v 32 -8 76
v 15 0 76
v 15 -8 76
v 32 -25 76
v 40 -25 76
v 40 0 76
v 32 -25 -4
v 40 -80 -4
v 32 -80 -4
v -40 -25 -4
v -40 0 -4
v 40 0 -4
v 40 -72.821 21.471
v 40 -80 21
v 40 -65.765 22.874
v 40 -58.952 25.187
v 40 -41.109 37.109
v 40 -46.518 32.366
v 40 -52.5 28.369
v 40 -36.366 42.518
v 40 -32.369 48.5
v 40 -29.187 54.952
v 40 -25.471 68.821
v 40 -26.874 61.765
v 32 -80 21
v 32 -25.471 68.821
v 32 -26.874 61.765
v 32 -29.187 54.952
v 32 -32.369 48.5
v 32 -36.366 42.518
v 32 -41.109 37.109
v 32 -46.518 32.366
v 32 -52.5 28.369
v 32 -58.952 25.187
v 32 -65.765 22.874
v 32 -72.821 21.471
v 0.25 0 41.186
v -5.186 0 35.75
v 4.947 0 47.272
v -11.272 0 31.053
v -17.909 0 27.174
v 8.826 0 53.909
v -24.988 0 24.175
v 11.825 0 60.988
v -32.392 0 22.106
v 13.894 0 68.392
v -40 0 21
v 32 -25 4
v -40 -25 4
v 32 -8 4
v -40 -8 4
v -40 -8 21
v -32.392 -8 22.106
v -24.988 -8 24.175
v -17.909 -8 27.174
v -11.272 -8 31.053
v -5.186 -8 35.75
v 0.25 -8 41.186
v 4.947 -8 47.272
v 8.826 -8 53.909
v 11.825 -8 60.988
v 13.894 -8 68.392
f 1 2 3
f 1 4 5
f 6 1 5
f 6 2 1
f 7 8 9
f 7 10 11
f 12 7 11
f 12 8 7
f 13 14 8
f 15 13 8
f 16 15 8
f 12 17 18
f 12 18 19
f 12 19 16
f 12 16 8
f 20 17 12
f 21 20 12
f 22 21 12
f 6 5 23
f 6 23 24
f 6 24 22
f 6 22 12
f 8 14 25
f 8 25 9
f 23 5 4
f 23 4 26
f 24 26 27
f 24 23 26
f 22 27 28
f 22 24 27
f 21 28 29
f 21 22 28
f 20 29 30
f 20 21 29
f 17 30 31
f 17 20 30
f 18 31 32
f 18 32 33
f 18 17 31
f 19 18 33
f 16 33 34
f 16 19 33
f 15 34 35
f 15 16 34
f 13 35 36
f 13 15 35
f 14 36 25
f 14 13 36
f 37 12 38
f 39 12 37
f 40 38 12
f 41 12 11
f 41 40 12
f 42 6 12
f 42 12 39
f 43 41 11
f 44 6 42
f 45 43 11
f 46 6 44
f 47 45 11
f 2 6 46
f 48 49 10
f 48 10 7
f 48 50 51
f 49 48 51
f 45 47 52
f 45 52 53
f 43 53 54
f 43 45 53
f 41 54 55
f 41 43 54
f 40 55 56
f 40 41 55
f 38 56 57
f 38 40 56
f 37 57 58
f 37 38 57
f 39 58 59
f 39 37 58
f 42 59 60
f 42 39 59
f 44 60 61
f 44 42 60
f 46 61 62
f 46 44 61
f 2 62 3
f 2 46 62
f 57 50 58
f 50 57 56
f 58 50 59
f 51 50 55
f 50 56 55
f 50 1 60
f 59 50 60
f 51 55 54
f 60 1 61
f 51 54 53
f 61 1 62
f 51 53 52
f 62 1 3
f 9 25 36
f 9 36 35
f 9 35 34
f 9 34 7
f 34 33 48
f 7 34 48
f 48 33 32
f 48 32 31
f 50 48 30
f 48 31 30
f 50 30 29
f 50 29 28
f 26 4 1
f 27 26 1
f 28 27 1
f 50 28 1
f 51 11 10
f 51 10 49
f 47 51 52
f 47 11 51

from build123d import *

# Parameters (mm, degrees)
F1_DEPTH = 25
F3_DEPTH = 8
F5_DEPTH = 8


with BuildPart() as f1:
    # F0 (on Front) → F1 (new body)
    with BuildSketch(Plane.XZ):
        Polygon((-40, -4), (40, -4), (40, 76), (32, 76), (32, 4), (-40, 4), align=None)
    extrude(amount=F1_DEPTH)

    # F2 (on face) → F3 (join)
    with BuildSketch(Plane(origin=(0, 0, 0), x_dir=(-1, 0, 0), z_dir=(0, 1, 0))):
        with BuildLine():
            Line((-32, 4), (40, 4))
            Line((40, 4), (40, 21))
            ThreePointArc((40, 21), (2.3807130871, 38.3807130871), (-15, 76))
            Line((-15, 76), (-32, 76))
            Line((-32, 76), (-32, 4))
        make_face()
    extrude(amount=-F3_DEPTH)

    # F4 (on face) → F5 (join)
    with BuildSketch(Plane.YZ.offset(40)):
        with BuildLine():
            Line((-80, -4), (-25, -4))
            Line((-25, -4), (-25, 76))
            ThreePointArc((-25, 76), (-41.1091270347, 37.1091270347), (-80, 21))
            Line((-80, 21), (-80, -4))
        make_face()
    extrude(amount=-F5_DEPTH)


solid = f1.part
